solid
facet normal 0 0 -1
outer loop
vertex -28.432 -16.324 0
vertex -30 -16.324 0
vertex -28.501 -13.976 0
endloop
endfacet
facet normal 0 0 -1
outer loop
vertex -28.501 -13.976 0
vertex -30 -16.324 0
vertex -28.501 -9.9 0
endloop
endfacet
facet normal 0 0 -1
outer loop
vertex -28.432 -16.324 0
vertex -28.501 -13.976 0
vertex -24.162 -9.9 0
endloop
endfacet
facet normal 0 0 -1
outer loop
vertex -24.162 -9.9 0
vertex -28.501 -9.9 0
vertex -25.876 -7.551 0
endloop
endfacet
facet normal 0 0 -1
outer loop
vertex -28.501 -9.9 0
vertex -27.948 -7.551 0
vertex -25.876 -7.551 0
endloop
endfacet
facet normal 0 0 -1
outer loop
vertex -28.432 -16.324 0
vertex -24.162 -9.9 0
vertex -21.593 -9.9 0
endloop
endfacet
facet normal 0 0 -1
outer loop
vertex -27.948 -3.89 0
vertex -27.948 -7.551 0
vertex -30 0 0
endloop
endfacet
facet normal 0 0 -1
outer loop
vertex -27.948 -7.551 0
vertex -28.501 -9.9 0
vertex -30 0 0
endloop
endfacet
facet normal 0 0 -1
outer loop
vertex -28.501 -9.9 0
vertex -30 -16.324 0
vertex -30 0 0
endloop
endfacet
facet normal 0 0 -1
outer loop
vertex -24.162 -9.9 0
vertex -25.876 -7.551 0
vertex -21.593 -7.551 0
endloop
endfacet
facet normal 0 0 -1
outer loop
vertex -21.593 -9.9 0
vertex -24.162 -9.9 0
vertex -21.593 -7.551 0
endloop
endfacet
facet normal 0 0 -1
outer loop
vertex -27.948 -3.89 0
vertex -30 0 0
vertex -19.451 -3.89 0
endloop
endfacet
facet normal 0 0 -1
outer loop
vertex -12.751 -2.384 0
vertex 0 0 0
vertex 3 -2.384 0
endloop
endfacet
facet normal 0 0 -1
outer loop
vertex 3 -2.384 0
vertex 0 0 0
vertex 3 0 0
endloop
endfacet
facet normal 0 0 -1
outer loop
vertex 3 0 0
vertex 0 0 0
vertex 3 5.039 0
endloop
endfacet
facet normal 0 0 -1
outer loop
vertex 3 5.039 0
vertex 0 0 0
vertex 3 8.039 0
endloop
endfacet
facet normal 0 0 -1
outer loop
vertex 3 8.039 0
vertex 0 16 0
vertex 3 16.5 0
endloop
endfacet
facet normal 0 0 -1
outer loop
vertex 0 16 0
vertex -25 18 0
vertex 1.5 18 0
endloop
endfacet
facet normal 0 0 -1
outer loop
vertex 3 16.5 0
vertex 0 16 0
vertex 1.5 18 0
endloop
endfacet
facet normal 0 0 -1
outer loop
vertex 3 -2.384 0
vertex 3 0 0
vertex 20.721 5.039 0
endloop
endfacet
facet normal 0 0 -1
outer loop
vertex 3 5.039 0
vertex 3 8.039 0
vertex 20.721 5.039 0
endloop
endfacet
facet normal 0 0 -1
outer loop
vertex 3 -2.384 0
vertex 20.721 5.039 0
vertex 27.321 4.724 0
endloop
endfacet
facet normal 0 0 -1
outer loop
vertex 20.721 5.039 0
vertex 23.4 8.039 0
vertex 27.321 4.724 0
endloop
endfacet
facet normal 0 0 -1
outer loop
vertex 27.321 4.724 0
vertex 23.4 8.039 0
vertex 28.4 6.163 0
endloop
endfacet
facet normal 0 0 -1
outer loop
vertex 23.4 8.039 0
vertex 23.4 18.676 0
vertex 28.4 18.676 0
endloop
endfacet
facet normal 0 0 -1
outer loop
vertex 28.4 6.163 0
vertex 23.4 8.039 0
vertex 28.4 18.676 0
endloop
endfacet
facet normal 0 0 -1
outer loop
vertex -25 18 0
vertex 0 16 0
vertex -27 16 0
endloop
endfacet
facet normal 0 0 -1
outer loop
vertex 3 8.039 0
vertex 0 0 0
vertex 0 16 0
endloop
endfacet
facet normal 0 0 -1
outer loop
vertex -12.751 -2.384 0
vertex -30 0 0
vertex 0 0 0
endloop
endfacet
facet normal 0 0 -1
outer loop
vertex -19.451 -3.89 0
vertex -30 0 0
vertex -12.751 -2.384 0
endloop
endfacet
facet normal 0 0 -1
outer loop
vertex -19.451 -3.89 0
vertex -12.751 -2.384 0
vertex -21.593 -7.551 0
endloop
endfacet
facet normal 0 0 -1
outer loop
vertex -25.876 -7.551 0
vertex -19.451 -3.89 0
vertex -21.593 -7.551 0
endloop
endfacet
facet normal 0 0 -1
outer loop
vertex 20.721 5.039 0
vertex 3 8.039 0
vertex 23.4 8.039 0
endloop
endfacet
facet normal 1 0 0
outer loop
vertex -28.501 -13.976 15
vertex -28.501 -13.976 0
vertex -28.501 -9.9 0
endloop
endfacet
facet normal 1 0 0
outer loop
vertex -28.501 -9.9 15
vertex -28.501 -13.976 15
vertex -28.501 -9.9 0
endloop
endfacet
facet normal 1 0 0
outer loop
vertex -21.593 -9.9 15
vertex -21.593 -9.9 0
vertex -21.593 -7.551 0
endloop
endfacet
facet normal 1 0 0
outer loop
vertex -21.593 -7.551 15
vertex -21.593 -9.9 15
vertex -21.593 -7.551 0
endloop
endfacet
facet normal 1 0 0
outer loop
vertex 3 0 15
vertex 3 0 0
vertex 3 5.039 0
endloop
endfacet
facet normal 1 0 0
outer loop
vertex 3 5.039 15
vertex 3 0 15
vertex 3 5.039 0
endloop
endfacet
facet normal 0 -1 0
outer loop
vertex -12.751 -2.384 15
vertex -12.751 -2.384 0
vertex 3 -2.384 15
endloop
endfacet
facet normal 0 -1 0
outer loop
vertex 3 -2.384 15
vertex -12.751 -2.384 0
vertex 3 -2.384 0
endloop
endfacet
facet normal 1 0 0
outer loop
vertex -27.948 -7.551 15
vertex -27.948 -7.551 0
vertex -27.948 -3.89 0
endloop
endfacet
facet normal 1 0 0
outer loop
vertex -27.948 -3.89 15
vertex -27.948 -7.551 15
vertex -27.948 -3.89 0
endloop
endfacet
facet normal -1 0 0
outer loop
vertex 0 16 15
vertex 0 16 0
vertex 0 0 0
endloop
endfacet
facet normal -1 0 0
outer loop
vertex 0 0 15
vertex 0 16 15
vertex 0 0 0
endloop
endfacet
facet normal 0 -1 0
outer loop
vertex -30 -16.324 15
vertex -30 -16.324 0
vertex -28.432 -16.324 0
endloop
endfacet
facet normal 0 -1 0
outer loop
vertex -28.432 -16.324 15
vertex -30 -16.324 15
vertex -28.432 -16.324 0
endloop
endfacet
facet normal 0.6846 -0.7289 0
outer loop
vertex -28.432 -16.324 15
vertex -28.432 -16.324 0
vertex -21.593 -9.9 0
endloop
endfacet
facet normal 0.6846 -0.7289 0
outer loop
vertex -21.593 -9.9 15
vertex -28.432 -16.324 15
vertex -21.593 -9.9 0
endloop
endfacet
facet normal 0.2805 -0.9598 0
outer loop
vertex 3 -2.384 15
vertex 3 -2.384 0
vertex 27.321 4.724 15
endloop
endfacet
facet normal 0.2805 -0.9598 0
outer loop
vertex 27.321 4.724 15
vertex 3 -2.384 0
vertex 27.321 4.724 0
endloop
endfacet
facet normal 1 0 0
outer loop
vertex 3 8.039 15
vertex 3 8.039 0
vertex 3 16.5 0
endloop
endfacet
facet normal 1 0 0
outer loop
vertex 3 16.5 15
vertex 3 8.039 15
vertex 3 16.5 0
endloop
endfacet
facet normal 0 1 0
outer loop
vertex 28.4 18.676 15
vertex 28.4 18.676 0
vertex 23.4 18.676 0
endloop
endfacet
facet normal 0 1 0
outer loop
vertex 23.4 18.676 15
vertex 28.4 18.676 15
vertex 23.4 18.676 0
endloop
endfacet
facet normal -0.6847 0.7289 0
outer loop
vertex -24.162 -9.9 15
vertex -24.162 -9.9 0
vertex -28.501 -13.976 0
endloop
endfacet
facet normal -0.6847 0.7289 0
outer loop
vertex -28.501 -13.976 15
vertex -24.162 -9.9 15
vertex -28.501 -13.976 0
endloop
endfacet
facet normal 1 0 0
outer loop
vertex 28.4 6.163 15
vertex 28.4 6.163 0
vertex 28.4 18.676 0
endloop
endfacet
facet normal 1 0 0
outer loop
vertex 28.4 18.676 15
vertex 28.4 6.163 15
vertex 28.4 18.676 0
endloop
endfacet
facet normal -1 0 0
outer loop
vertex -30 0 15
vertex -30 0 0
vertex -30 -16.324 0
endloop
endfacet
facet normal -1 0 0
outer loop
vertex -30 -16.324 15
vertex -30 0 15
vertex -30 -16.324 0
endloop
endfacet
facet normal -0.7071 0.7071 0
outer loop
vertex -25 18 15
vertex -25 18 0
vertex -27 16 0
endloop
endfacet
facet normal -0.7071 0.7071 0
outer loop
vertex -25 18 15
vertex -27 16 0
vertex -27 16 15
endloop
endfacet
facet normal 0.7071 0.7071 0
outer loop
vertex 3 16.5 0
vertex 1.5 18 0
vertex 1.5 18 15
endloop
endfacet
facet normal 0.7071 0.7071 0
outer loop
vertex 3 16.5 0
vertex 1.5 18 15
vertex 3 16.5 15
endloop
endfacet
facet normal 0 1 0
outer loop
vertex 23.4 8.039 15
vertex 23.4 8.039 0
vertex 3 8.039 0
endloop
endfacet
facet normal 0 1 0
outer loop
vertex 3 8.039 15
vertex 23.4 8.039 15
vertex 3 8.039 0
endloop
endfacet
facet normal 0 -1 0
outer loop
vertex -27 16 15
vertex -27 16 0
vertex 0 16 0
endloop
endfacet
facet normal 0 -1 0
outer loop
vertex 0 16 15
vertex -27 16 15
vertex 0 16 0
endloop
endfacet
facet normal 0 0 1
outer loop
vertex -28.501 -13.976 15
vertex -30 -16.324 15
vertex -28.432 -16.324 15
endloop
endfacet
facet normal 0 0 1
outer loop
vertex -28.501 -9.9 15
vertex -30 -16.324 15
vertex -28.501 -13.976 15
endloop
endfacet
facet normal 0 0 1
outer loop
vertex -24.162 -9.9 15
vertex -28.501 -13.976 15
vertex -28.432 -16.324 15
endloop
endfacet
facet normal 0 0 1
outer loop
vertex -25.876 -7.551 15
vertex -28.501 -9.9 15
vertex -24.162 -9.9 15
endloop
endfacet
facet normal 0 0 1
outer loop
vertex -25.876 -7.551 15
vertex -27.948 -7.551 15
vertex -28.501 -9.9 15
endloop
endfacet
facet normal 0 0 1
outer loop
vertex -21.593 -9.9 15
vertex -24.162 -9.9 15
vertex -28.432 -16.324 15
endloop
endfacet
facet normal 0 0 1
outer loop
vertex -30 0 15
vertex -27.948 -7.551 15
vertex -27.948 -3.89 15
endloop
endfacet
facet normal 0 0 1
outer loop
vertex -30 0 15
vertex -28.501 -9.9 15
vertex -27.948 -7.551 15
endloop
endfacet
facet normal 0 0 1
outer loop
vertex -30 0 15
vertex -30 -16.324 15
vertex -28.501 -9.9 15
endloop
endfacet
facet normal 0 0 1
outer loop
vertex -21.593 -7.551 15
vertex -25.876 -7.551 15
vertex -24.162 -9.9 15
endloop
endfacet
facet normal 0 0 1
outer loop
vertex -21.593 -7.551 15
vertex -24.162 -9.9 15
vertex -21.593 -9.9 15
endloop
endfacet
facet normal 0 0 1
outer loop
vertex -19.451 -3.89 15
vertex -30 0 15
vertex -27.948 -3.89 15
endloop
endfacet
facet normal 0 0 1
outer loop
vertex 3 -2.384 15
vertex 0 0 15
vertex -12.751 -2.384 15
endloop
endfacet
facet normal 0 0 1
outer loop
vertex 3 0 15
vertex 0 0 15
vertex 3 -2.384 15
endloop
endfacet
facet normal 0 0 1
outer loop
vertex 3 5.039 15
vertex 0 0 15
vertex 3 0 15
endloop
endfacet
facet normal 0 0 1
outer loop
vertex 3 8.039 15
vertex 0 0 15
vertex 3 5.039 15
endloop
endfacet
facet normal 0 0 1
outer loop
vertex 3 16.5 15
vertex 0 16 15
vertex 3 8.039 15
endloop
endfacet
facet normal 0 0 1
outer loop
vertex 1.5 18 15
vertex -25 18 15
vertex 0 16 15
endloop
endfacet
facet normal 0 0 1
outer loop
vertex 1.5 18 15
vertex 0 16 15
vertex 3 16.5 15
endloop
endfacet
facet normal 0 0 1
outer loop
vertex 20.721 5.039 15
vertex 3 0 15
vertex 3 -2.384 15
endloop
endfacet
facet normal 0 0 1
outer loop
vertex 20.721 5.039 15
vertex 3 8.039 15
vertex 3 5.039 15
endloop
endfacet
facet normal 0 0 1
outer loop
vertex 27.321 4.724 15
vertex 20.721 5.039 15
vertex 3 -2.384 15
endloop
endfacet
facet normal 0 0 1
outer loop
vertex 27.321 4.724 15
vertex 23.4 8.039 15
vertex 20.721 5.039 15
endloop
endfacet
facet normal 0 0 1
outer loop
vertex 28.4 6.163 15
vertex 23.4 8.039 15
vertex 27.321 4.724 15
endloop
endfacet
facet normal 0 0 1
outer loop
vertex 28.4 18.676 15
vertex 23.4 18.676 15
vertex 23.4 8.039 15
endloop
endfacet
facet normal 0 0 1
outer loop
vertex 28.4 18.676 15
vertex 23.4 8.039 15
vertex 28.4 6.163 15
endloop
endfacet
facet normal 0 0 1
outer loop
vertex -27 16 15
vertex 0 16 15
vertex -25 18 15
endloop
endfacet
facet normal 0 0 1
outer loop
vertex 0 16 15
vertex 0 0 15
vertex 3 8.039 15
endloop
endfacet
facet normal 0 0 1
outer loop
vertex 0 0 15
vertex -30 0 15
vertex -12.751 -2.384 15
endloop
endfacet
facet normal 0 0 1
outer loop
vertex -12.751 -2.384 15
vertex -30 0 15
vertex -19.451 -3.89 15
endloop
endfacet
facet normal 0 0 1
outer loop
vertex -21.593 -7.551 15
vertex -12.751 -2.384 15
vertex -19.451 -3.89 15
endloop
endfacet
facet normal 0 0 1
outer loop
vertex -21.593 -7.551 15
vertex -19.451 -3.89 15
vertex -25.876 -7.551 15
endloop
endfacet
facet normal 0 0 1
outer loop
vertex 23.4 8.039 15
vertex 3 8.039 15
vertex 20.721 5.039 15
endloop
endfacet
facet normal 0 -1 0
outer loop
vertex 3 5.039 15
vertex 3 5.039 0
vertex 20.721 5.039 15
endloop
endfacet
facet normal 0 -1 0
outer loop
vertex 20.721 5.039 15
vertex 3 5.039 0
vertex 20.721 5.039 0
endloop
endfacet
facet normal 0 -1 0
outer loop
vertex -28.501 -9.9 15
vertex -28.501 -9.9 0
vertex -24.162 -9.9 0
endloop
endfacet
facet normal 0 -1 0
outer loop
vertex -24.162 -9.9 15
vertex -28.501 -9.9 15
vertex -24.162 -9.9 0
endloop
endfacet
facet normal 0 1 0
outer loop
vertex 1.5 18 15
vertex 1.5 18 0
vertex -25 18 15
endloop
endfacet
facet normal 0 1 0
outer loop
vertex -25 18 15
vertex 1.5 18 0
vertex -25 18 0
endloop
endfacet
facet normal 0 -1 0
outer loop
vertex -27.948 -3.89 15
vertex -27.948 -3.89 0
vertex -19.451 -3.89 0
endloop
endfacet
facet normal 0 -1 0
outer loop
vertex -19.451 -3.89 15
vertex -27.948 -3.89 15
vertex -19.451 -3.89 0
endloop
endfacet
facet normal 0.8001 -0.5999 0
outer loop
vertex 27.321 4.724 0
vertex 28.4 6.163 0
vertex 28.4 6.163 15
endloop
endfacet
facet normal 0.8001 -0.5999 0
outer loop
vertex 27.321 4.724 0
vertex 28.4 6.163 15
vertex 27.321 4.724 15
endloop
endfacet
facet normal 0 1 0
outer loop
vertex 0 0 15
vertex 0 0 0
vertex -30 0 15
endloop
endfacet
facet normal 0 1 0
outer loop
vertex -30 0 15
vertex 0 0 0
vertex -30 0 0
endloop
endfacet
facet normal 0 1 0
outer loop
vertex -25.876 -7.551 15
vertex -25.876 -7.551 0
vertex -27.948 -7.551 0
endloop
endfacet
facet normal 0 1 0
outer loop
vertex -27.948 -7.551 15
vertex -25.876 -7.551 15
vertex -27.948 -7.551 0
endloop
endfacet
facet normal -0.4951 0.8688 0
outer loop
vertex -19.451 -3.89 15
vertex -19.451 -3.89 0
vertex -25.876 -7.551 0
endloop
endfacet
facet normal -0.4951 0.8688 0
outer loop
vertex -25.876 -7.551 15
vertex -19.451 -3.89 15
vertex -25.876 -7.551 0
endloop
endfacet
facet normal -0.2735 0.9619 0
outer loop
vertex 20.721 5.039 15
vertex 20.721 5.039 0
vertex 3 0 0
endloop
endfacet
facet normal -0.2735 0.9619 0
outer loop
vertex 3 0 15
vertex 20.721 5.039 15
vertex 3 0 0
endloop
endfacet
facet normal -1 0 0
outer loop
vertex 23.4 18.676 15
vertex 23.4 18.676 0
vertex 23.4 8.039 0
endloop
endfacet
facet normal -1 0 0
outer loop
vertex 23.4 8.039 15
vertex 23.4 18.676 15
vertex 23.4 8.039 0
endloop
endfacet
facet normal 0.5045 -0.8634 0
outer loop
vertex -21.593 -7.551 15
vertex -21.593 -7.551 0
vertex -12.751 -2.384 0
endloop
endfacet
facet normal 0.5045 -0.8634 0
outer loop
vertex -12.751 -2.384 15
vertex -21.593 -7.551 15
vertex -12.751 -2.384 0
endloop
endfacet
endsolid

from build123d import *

# Parameters (mm, degrees)
F1_DEPTH    = 15
F2_T1_DEPTH = 22.7150489639
F2_T3_DEPTH = 20.8646002419
F3_SIZE     = 1.99999


# Not quite as in the source:
# - a fillet or chamfer that OpenCascade refuses, or shapes differently, is made with other operations: its cross-section is extruded or revolved along the edge and cut away or added
# - a fillet or chamfer is up to 0.001 mm smaller than in the source, because OpenCascade refuses the exact size


with BuildPart() as f1:
    # F0 (on Top) → F1 (new body)
    with BuildSketch(Plane.XY):
        Polygon((0, 16), (0, 0), (-30, 0), (-30, -2.3844742682), (-30, -16.3243375719), (-28.4316577017, -16.3243375719), (-21.5928480029, -9.9000008777), (-21.5928480029, -7.5513185002), (-12.7507485449, -2.3844742682), (3, -2.3844742682), (28.4, 5.0389636308), (28.4, 18.6757165939), (23.4, 18.6757165939), (23.4, 8.0389636308), (3, 8.0389636308), (3, 18), (-27, 18), (-27, 16), align=None)
        Polygon((-28.5007357597, -13.9756565914), (-28.5007357597, -10.7289487496), (-28.5007357597, -9.9000008777), (-24.1621347258, -9.9000008777), align=None, mode=Mode.SUBTRACT)
        Polygon((-27.9481057078, -3.890137421), (-19.4514021277, -3.890137421), (-25.8757378906, -7.5513185002), (-27.9481057078, -7.5513185002), align=None, mode=Mode.SUBTRACT)
        Polygon((3, 5.0389636308), (20.7205470651, 5.0389636308), (3, 0), align=None, mode=Mode.SUBTRACT)
    extrude(amount=F1_DEPTH)

    # F2: chamfer of 1.5 on 2 edges, made by hand

    # F2_s2 → F2_t1 (cut)
    with BuildSketch(Plane.XY.offset(-3.8575244819)):
        Polygon((1.5, 18), (3, 16.5), (3, 18), align=None)
    extrude(amount=F2_T1_DEPTH, mode=Mode.SUBTRACT)

    # F2_s4 → F2_t3 (cut)
    with BuildSketch(Plane.XY.offset(-2.932300121)):
        Polygon((28.4, 6.163321624), (27.3207889969, 4.7235519827), (28.4, 5.0389636308), align=None)
    extrude(amount=F2_T3_DEPTH, mode=Mode.SUBTRACT)

    # F3 (size 2 in the source; OpenCascade refuses exactly that, so slightly less here)
    f3_edges = [f1.edges().sort_by_distance(p)[0] for p in [
        (-27, 18, 7.5),
    ]]
    chamfer(f3_edges, length=F3_SIZE)


solid = f1.part
